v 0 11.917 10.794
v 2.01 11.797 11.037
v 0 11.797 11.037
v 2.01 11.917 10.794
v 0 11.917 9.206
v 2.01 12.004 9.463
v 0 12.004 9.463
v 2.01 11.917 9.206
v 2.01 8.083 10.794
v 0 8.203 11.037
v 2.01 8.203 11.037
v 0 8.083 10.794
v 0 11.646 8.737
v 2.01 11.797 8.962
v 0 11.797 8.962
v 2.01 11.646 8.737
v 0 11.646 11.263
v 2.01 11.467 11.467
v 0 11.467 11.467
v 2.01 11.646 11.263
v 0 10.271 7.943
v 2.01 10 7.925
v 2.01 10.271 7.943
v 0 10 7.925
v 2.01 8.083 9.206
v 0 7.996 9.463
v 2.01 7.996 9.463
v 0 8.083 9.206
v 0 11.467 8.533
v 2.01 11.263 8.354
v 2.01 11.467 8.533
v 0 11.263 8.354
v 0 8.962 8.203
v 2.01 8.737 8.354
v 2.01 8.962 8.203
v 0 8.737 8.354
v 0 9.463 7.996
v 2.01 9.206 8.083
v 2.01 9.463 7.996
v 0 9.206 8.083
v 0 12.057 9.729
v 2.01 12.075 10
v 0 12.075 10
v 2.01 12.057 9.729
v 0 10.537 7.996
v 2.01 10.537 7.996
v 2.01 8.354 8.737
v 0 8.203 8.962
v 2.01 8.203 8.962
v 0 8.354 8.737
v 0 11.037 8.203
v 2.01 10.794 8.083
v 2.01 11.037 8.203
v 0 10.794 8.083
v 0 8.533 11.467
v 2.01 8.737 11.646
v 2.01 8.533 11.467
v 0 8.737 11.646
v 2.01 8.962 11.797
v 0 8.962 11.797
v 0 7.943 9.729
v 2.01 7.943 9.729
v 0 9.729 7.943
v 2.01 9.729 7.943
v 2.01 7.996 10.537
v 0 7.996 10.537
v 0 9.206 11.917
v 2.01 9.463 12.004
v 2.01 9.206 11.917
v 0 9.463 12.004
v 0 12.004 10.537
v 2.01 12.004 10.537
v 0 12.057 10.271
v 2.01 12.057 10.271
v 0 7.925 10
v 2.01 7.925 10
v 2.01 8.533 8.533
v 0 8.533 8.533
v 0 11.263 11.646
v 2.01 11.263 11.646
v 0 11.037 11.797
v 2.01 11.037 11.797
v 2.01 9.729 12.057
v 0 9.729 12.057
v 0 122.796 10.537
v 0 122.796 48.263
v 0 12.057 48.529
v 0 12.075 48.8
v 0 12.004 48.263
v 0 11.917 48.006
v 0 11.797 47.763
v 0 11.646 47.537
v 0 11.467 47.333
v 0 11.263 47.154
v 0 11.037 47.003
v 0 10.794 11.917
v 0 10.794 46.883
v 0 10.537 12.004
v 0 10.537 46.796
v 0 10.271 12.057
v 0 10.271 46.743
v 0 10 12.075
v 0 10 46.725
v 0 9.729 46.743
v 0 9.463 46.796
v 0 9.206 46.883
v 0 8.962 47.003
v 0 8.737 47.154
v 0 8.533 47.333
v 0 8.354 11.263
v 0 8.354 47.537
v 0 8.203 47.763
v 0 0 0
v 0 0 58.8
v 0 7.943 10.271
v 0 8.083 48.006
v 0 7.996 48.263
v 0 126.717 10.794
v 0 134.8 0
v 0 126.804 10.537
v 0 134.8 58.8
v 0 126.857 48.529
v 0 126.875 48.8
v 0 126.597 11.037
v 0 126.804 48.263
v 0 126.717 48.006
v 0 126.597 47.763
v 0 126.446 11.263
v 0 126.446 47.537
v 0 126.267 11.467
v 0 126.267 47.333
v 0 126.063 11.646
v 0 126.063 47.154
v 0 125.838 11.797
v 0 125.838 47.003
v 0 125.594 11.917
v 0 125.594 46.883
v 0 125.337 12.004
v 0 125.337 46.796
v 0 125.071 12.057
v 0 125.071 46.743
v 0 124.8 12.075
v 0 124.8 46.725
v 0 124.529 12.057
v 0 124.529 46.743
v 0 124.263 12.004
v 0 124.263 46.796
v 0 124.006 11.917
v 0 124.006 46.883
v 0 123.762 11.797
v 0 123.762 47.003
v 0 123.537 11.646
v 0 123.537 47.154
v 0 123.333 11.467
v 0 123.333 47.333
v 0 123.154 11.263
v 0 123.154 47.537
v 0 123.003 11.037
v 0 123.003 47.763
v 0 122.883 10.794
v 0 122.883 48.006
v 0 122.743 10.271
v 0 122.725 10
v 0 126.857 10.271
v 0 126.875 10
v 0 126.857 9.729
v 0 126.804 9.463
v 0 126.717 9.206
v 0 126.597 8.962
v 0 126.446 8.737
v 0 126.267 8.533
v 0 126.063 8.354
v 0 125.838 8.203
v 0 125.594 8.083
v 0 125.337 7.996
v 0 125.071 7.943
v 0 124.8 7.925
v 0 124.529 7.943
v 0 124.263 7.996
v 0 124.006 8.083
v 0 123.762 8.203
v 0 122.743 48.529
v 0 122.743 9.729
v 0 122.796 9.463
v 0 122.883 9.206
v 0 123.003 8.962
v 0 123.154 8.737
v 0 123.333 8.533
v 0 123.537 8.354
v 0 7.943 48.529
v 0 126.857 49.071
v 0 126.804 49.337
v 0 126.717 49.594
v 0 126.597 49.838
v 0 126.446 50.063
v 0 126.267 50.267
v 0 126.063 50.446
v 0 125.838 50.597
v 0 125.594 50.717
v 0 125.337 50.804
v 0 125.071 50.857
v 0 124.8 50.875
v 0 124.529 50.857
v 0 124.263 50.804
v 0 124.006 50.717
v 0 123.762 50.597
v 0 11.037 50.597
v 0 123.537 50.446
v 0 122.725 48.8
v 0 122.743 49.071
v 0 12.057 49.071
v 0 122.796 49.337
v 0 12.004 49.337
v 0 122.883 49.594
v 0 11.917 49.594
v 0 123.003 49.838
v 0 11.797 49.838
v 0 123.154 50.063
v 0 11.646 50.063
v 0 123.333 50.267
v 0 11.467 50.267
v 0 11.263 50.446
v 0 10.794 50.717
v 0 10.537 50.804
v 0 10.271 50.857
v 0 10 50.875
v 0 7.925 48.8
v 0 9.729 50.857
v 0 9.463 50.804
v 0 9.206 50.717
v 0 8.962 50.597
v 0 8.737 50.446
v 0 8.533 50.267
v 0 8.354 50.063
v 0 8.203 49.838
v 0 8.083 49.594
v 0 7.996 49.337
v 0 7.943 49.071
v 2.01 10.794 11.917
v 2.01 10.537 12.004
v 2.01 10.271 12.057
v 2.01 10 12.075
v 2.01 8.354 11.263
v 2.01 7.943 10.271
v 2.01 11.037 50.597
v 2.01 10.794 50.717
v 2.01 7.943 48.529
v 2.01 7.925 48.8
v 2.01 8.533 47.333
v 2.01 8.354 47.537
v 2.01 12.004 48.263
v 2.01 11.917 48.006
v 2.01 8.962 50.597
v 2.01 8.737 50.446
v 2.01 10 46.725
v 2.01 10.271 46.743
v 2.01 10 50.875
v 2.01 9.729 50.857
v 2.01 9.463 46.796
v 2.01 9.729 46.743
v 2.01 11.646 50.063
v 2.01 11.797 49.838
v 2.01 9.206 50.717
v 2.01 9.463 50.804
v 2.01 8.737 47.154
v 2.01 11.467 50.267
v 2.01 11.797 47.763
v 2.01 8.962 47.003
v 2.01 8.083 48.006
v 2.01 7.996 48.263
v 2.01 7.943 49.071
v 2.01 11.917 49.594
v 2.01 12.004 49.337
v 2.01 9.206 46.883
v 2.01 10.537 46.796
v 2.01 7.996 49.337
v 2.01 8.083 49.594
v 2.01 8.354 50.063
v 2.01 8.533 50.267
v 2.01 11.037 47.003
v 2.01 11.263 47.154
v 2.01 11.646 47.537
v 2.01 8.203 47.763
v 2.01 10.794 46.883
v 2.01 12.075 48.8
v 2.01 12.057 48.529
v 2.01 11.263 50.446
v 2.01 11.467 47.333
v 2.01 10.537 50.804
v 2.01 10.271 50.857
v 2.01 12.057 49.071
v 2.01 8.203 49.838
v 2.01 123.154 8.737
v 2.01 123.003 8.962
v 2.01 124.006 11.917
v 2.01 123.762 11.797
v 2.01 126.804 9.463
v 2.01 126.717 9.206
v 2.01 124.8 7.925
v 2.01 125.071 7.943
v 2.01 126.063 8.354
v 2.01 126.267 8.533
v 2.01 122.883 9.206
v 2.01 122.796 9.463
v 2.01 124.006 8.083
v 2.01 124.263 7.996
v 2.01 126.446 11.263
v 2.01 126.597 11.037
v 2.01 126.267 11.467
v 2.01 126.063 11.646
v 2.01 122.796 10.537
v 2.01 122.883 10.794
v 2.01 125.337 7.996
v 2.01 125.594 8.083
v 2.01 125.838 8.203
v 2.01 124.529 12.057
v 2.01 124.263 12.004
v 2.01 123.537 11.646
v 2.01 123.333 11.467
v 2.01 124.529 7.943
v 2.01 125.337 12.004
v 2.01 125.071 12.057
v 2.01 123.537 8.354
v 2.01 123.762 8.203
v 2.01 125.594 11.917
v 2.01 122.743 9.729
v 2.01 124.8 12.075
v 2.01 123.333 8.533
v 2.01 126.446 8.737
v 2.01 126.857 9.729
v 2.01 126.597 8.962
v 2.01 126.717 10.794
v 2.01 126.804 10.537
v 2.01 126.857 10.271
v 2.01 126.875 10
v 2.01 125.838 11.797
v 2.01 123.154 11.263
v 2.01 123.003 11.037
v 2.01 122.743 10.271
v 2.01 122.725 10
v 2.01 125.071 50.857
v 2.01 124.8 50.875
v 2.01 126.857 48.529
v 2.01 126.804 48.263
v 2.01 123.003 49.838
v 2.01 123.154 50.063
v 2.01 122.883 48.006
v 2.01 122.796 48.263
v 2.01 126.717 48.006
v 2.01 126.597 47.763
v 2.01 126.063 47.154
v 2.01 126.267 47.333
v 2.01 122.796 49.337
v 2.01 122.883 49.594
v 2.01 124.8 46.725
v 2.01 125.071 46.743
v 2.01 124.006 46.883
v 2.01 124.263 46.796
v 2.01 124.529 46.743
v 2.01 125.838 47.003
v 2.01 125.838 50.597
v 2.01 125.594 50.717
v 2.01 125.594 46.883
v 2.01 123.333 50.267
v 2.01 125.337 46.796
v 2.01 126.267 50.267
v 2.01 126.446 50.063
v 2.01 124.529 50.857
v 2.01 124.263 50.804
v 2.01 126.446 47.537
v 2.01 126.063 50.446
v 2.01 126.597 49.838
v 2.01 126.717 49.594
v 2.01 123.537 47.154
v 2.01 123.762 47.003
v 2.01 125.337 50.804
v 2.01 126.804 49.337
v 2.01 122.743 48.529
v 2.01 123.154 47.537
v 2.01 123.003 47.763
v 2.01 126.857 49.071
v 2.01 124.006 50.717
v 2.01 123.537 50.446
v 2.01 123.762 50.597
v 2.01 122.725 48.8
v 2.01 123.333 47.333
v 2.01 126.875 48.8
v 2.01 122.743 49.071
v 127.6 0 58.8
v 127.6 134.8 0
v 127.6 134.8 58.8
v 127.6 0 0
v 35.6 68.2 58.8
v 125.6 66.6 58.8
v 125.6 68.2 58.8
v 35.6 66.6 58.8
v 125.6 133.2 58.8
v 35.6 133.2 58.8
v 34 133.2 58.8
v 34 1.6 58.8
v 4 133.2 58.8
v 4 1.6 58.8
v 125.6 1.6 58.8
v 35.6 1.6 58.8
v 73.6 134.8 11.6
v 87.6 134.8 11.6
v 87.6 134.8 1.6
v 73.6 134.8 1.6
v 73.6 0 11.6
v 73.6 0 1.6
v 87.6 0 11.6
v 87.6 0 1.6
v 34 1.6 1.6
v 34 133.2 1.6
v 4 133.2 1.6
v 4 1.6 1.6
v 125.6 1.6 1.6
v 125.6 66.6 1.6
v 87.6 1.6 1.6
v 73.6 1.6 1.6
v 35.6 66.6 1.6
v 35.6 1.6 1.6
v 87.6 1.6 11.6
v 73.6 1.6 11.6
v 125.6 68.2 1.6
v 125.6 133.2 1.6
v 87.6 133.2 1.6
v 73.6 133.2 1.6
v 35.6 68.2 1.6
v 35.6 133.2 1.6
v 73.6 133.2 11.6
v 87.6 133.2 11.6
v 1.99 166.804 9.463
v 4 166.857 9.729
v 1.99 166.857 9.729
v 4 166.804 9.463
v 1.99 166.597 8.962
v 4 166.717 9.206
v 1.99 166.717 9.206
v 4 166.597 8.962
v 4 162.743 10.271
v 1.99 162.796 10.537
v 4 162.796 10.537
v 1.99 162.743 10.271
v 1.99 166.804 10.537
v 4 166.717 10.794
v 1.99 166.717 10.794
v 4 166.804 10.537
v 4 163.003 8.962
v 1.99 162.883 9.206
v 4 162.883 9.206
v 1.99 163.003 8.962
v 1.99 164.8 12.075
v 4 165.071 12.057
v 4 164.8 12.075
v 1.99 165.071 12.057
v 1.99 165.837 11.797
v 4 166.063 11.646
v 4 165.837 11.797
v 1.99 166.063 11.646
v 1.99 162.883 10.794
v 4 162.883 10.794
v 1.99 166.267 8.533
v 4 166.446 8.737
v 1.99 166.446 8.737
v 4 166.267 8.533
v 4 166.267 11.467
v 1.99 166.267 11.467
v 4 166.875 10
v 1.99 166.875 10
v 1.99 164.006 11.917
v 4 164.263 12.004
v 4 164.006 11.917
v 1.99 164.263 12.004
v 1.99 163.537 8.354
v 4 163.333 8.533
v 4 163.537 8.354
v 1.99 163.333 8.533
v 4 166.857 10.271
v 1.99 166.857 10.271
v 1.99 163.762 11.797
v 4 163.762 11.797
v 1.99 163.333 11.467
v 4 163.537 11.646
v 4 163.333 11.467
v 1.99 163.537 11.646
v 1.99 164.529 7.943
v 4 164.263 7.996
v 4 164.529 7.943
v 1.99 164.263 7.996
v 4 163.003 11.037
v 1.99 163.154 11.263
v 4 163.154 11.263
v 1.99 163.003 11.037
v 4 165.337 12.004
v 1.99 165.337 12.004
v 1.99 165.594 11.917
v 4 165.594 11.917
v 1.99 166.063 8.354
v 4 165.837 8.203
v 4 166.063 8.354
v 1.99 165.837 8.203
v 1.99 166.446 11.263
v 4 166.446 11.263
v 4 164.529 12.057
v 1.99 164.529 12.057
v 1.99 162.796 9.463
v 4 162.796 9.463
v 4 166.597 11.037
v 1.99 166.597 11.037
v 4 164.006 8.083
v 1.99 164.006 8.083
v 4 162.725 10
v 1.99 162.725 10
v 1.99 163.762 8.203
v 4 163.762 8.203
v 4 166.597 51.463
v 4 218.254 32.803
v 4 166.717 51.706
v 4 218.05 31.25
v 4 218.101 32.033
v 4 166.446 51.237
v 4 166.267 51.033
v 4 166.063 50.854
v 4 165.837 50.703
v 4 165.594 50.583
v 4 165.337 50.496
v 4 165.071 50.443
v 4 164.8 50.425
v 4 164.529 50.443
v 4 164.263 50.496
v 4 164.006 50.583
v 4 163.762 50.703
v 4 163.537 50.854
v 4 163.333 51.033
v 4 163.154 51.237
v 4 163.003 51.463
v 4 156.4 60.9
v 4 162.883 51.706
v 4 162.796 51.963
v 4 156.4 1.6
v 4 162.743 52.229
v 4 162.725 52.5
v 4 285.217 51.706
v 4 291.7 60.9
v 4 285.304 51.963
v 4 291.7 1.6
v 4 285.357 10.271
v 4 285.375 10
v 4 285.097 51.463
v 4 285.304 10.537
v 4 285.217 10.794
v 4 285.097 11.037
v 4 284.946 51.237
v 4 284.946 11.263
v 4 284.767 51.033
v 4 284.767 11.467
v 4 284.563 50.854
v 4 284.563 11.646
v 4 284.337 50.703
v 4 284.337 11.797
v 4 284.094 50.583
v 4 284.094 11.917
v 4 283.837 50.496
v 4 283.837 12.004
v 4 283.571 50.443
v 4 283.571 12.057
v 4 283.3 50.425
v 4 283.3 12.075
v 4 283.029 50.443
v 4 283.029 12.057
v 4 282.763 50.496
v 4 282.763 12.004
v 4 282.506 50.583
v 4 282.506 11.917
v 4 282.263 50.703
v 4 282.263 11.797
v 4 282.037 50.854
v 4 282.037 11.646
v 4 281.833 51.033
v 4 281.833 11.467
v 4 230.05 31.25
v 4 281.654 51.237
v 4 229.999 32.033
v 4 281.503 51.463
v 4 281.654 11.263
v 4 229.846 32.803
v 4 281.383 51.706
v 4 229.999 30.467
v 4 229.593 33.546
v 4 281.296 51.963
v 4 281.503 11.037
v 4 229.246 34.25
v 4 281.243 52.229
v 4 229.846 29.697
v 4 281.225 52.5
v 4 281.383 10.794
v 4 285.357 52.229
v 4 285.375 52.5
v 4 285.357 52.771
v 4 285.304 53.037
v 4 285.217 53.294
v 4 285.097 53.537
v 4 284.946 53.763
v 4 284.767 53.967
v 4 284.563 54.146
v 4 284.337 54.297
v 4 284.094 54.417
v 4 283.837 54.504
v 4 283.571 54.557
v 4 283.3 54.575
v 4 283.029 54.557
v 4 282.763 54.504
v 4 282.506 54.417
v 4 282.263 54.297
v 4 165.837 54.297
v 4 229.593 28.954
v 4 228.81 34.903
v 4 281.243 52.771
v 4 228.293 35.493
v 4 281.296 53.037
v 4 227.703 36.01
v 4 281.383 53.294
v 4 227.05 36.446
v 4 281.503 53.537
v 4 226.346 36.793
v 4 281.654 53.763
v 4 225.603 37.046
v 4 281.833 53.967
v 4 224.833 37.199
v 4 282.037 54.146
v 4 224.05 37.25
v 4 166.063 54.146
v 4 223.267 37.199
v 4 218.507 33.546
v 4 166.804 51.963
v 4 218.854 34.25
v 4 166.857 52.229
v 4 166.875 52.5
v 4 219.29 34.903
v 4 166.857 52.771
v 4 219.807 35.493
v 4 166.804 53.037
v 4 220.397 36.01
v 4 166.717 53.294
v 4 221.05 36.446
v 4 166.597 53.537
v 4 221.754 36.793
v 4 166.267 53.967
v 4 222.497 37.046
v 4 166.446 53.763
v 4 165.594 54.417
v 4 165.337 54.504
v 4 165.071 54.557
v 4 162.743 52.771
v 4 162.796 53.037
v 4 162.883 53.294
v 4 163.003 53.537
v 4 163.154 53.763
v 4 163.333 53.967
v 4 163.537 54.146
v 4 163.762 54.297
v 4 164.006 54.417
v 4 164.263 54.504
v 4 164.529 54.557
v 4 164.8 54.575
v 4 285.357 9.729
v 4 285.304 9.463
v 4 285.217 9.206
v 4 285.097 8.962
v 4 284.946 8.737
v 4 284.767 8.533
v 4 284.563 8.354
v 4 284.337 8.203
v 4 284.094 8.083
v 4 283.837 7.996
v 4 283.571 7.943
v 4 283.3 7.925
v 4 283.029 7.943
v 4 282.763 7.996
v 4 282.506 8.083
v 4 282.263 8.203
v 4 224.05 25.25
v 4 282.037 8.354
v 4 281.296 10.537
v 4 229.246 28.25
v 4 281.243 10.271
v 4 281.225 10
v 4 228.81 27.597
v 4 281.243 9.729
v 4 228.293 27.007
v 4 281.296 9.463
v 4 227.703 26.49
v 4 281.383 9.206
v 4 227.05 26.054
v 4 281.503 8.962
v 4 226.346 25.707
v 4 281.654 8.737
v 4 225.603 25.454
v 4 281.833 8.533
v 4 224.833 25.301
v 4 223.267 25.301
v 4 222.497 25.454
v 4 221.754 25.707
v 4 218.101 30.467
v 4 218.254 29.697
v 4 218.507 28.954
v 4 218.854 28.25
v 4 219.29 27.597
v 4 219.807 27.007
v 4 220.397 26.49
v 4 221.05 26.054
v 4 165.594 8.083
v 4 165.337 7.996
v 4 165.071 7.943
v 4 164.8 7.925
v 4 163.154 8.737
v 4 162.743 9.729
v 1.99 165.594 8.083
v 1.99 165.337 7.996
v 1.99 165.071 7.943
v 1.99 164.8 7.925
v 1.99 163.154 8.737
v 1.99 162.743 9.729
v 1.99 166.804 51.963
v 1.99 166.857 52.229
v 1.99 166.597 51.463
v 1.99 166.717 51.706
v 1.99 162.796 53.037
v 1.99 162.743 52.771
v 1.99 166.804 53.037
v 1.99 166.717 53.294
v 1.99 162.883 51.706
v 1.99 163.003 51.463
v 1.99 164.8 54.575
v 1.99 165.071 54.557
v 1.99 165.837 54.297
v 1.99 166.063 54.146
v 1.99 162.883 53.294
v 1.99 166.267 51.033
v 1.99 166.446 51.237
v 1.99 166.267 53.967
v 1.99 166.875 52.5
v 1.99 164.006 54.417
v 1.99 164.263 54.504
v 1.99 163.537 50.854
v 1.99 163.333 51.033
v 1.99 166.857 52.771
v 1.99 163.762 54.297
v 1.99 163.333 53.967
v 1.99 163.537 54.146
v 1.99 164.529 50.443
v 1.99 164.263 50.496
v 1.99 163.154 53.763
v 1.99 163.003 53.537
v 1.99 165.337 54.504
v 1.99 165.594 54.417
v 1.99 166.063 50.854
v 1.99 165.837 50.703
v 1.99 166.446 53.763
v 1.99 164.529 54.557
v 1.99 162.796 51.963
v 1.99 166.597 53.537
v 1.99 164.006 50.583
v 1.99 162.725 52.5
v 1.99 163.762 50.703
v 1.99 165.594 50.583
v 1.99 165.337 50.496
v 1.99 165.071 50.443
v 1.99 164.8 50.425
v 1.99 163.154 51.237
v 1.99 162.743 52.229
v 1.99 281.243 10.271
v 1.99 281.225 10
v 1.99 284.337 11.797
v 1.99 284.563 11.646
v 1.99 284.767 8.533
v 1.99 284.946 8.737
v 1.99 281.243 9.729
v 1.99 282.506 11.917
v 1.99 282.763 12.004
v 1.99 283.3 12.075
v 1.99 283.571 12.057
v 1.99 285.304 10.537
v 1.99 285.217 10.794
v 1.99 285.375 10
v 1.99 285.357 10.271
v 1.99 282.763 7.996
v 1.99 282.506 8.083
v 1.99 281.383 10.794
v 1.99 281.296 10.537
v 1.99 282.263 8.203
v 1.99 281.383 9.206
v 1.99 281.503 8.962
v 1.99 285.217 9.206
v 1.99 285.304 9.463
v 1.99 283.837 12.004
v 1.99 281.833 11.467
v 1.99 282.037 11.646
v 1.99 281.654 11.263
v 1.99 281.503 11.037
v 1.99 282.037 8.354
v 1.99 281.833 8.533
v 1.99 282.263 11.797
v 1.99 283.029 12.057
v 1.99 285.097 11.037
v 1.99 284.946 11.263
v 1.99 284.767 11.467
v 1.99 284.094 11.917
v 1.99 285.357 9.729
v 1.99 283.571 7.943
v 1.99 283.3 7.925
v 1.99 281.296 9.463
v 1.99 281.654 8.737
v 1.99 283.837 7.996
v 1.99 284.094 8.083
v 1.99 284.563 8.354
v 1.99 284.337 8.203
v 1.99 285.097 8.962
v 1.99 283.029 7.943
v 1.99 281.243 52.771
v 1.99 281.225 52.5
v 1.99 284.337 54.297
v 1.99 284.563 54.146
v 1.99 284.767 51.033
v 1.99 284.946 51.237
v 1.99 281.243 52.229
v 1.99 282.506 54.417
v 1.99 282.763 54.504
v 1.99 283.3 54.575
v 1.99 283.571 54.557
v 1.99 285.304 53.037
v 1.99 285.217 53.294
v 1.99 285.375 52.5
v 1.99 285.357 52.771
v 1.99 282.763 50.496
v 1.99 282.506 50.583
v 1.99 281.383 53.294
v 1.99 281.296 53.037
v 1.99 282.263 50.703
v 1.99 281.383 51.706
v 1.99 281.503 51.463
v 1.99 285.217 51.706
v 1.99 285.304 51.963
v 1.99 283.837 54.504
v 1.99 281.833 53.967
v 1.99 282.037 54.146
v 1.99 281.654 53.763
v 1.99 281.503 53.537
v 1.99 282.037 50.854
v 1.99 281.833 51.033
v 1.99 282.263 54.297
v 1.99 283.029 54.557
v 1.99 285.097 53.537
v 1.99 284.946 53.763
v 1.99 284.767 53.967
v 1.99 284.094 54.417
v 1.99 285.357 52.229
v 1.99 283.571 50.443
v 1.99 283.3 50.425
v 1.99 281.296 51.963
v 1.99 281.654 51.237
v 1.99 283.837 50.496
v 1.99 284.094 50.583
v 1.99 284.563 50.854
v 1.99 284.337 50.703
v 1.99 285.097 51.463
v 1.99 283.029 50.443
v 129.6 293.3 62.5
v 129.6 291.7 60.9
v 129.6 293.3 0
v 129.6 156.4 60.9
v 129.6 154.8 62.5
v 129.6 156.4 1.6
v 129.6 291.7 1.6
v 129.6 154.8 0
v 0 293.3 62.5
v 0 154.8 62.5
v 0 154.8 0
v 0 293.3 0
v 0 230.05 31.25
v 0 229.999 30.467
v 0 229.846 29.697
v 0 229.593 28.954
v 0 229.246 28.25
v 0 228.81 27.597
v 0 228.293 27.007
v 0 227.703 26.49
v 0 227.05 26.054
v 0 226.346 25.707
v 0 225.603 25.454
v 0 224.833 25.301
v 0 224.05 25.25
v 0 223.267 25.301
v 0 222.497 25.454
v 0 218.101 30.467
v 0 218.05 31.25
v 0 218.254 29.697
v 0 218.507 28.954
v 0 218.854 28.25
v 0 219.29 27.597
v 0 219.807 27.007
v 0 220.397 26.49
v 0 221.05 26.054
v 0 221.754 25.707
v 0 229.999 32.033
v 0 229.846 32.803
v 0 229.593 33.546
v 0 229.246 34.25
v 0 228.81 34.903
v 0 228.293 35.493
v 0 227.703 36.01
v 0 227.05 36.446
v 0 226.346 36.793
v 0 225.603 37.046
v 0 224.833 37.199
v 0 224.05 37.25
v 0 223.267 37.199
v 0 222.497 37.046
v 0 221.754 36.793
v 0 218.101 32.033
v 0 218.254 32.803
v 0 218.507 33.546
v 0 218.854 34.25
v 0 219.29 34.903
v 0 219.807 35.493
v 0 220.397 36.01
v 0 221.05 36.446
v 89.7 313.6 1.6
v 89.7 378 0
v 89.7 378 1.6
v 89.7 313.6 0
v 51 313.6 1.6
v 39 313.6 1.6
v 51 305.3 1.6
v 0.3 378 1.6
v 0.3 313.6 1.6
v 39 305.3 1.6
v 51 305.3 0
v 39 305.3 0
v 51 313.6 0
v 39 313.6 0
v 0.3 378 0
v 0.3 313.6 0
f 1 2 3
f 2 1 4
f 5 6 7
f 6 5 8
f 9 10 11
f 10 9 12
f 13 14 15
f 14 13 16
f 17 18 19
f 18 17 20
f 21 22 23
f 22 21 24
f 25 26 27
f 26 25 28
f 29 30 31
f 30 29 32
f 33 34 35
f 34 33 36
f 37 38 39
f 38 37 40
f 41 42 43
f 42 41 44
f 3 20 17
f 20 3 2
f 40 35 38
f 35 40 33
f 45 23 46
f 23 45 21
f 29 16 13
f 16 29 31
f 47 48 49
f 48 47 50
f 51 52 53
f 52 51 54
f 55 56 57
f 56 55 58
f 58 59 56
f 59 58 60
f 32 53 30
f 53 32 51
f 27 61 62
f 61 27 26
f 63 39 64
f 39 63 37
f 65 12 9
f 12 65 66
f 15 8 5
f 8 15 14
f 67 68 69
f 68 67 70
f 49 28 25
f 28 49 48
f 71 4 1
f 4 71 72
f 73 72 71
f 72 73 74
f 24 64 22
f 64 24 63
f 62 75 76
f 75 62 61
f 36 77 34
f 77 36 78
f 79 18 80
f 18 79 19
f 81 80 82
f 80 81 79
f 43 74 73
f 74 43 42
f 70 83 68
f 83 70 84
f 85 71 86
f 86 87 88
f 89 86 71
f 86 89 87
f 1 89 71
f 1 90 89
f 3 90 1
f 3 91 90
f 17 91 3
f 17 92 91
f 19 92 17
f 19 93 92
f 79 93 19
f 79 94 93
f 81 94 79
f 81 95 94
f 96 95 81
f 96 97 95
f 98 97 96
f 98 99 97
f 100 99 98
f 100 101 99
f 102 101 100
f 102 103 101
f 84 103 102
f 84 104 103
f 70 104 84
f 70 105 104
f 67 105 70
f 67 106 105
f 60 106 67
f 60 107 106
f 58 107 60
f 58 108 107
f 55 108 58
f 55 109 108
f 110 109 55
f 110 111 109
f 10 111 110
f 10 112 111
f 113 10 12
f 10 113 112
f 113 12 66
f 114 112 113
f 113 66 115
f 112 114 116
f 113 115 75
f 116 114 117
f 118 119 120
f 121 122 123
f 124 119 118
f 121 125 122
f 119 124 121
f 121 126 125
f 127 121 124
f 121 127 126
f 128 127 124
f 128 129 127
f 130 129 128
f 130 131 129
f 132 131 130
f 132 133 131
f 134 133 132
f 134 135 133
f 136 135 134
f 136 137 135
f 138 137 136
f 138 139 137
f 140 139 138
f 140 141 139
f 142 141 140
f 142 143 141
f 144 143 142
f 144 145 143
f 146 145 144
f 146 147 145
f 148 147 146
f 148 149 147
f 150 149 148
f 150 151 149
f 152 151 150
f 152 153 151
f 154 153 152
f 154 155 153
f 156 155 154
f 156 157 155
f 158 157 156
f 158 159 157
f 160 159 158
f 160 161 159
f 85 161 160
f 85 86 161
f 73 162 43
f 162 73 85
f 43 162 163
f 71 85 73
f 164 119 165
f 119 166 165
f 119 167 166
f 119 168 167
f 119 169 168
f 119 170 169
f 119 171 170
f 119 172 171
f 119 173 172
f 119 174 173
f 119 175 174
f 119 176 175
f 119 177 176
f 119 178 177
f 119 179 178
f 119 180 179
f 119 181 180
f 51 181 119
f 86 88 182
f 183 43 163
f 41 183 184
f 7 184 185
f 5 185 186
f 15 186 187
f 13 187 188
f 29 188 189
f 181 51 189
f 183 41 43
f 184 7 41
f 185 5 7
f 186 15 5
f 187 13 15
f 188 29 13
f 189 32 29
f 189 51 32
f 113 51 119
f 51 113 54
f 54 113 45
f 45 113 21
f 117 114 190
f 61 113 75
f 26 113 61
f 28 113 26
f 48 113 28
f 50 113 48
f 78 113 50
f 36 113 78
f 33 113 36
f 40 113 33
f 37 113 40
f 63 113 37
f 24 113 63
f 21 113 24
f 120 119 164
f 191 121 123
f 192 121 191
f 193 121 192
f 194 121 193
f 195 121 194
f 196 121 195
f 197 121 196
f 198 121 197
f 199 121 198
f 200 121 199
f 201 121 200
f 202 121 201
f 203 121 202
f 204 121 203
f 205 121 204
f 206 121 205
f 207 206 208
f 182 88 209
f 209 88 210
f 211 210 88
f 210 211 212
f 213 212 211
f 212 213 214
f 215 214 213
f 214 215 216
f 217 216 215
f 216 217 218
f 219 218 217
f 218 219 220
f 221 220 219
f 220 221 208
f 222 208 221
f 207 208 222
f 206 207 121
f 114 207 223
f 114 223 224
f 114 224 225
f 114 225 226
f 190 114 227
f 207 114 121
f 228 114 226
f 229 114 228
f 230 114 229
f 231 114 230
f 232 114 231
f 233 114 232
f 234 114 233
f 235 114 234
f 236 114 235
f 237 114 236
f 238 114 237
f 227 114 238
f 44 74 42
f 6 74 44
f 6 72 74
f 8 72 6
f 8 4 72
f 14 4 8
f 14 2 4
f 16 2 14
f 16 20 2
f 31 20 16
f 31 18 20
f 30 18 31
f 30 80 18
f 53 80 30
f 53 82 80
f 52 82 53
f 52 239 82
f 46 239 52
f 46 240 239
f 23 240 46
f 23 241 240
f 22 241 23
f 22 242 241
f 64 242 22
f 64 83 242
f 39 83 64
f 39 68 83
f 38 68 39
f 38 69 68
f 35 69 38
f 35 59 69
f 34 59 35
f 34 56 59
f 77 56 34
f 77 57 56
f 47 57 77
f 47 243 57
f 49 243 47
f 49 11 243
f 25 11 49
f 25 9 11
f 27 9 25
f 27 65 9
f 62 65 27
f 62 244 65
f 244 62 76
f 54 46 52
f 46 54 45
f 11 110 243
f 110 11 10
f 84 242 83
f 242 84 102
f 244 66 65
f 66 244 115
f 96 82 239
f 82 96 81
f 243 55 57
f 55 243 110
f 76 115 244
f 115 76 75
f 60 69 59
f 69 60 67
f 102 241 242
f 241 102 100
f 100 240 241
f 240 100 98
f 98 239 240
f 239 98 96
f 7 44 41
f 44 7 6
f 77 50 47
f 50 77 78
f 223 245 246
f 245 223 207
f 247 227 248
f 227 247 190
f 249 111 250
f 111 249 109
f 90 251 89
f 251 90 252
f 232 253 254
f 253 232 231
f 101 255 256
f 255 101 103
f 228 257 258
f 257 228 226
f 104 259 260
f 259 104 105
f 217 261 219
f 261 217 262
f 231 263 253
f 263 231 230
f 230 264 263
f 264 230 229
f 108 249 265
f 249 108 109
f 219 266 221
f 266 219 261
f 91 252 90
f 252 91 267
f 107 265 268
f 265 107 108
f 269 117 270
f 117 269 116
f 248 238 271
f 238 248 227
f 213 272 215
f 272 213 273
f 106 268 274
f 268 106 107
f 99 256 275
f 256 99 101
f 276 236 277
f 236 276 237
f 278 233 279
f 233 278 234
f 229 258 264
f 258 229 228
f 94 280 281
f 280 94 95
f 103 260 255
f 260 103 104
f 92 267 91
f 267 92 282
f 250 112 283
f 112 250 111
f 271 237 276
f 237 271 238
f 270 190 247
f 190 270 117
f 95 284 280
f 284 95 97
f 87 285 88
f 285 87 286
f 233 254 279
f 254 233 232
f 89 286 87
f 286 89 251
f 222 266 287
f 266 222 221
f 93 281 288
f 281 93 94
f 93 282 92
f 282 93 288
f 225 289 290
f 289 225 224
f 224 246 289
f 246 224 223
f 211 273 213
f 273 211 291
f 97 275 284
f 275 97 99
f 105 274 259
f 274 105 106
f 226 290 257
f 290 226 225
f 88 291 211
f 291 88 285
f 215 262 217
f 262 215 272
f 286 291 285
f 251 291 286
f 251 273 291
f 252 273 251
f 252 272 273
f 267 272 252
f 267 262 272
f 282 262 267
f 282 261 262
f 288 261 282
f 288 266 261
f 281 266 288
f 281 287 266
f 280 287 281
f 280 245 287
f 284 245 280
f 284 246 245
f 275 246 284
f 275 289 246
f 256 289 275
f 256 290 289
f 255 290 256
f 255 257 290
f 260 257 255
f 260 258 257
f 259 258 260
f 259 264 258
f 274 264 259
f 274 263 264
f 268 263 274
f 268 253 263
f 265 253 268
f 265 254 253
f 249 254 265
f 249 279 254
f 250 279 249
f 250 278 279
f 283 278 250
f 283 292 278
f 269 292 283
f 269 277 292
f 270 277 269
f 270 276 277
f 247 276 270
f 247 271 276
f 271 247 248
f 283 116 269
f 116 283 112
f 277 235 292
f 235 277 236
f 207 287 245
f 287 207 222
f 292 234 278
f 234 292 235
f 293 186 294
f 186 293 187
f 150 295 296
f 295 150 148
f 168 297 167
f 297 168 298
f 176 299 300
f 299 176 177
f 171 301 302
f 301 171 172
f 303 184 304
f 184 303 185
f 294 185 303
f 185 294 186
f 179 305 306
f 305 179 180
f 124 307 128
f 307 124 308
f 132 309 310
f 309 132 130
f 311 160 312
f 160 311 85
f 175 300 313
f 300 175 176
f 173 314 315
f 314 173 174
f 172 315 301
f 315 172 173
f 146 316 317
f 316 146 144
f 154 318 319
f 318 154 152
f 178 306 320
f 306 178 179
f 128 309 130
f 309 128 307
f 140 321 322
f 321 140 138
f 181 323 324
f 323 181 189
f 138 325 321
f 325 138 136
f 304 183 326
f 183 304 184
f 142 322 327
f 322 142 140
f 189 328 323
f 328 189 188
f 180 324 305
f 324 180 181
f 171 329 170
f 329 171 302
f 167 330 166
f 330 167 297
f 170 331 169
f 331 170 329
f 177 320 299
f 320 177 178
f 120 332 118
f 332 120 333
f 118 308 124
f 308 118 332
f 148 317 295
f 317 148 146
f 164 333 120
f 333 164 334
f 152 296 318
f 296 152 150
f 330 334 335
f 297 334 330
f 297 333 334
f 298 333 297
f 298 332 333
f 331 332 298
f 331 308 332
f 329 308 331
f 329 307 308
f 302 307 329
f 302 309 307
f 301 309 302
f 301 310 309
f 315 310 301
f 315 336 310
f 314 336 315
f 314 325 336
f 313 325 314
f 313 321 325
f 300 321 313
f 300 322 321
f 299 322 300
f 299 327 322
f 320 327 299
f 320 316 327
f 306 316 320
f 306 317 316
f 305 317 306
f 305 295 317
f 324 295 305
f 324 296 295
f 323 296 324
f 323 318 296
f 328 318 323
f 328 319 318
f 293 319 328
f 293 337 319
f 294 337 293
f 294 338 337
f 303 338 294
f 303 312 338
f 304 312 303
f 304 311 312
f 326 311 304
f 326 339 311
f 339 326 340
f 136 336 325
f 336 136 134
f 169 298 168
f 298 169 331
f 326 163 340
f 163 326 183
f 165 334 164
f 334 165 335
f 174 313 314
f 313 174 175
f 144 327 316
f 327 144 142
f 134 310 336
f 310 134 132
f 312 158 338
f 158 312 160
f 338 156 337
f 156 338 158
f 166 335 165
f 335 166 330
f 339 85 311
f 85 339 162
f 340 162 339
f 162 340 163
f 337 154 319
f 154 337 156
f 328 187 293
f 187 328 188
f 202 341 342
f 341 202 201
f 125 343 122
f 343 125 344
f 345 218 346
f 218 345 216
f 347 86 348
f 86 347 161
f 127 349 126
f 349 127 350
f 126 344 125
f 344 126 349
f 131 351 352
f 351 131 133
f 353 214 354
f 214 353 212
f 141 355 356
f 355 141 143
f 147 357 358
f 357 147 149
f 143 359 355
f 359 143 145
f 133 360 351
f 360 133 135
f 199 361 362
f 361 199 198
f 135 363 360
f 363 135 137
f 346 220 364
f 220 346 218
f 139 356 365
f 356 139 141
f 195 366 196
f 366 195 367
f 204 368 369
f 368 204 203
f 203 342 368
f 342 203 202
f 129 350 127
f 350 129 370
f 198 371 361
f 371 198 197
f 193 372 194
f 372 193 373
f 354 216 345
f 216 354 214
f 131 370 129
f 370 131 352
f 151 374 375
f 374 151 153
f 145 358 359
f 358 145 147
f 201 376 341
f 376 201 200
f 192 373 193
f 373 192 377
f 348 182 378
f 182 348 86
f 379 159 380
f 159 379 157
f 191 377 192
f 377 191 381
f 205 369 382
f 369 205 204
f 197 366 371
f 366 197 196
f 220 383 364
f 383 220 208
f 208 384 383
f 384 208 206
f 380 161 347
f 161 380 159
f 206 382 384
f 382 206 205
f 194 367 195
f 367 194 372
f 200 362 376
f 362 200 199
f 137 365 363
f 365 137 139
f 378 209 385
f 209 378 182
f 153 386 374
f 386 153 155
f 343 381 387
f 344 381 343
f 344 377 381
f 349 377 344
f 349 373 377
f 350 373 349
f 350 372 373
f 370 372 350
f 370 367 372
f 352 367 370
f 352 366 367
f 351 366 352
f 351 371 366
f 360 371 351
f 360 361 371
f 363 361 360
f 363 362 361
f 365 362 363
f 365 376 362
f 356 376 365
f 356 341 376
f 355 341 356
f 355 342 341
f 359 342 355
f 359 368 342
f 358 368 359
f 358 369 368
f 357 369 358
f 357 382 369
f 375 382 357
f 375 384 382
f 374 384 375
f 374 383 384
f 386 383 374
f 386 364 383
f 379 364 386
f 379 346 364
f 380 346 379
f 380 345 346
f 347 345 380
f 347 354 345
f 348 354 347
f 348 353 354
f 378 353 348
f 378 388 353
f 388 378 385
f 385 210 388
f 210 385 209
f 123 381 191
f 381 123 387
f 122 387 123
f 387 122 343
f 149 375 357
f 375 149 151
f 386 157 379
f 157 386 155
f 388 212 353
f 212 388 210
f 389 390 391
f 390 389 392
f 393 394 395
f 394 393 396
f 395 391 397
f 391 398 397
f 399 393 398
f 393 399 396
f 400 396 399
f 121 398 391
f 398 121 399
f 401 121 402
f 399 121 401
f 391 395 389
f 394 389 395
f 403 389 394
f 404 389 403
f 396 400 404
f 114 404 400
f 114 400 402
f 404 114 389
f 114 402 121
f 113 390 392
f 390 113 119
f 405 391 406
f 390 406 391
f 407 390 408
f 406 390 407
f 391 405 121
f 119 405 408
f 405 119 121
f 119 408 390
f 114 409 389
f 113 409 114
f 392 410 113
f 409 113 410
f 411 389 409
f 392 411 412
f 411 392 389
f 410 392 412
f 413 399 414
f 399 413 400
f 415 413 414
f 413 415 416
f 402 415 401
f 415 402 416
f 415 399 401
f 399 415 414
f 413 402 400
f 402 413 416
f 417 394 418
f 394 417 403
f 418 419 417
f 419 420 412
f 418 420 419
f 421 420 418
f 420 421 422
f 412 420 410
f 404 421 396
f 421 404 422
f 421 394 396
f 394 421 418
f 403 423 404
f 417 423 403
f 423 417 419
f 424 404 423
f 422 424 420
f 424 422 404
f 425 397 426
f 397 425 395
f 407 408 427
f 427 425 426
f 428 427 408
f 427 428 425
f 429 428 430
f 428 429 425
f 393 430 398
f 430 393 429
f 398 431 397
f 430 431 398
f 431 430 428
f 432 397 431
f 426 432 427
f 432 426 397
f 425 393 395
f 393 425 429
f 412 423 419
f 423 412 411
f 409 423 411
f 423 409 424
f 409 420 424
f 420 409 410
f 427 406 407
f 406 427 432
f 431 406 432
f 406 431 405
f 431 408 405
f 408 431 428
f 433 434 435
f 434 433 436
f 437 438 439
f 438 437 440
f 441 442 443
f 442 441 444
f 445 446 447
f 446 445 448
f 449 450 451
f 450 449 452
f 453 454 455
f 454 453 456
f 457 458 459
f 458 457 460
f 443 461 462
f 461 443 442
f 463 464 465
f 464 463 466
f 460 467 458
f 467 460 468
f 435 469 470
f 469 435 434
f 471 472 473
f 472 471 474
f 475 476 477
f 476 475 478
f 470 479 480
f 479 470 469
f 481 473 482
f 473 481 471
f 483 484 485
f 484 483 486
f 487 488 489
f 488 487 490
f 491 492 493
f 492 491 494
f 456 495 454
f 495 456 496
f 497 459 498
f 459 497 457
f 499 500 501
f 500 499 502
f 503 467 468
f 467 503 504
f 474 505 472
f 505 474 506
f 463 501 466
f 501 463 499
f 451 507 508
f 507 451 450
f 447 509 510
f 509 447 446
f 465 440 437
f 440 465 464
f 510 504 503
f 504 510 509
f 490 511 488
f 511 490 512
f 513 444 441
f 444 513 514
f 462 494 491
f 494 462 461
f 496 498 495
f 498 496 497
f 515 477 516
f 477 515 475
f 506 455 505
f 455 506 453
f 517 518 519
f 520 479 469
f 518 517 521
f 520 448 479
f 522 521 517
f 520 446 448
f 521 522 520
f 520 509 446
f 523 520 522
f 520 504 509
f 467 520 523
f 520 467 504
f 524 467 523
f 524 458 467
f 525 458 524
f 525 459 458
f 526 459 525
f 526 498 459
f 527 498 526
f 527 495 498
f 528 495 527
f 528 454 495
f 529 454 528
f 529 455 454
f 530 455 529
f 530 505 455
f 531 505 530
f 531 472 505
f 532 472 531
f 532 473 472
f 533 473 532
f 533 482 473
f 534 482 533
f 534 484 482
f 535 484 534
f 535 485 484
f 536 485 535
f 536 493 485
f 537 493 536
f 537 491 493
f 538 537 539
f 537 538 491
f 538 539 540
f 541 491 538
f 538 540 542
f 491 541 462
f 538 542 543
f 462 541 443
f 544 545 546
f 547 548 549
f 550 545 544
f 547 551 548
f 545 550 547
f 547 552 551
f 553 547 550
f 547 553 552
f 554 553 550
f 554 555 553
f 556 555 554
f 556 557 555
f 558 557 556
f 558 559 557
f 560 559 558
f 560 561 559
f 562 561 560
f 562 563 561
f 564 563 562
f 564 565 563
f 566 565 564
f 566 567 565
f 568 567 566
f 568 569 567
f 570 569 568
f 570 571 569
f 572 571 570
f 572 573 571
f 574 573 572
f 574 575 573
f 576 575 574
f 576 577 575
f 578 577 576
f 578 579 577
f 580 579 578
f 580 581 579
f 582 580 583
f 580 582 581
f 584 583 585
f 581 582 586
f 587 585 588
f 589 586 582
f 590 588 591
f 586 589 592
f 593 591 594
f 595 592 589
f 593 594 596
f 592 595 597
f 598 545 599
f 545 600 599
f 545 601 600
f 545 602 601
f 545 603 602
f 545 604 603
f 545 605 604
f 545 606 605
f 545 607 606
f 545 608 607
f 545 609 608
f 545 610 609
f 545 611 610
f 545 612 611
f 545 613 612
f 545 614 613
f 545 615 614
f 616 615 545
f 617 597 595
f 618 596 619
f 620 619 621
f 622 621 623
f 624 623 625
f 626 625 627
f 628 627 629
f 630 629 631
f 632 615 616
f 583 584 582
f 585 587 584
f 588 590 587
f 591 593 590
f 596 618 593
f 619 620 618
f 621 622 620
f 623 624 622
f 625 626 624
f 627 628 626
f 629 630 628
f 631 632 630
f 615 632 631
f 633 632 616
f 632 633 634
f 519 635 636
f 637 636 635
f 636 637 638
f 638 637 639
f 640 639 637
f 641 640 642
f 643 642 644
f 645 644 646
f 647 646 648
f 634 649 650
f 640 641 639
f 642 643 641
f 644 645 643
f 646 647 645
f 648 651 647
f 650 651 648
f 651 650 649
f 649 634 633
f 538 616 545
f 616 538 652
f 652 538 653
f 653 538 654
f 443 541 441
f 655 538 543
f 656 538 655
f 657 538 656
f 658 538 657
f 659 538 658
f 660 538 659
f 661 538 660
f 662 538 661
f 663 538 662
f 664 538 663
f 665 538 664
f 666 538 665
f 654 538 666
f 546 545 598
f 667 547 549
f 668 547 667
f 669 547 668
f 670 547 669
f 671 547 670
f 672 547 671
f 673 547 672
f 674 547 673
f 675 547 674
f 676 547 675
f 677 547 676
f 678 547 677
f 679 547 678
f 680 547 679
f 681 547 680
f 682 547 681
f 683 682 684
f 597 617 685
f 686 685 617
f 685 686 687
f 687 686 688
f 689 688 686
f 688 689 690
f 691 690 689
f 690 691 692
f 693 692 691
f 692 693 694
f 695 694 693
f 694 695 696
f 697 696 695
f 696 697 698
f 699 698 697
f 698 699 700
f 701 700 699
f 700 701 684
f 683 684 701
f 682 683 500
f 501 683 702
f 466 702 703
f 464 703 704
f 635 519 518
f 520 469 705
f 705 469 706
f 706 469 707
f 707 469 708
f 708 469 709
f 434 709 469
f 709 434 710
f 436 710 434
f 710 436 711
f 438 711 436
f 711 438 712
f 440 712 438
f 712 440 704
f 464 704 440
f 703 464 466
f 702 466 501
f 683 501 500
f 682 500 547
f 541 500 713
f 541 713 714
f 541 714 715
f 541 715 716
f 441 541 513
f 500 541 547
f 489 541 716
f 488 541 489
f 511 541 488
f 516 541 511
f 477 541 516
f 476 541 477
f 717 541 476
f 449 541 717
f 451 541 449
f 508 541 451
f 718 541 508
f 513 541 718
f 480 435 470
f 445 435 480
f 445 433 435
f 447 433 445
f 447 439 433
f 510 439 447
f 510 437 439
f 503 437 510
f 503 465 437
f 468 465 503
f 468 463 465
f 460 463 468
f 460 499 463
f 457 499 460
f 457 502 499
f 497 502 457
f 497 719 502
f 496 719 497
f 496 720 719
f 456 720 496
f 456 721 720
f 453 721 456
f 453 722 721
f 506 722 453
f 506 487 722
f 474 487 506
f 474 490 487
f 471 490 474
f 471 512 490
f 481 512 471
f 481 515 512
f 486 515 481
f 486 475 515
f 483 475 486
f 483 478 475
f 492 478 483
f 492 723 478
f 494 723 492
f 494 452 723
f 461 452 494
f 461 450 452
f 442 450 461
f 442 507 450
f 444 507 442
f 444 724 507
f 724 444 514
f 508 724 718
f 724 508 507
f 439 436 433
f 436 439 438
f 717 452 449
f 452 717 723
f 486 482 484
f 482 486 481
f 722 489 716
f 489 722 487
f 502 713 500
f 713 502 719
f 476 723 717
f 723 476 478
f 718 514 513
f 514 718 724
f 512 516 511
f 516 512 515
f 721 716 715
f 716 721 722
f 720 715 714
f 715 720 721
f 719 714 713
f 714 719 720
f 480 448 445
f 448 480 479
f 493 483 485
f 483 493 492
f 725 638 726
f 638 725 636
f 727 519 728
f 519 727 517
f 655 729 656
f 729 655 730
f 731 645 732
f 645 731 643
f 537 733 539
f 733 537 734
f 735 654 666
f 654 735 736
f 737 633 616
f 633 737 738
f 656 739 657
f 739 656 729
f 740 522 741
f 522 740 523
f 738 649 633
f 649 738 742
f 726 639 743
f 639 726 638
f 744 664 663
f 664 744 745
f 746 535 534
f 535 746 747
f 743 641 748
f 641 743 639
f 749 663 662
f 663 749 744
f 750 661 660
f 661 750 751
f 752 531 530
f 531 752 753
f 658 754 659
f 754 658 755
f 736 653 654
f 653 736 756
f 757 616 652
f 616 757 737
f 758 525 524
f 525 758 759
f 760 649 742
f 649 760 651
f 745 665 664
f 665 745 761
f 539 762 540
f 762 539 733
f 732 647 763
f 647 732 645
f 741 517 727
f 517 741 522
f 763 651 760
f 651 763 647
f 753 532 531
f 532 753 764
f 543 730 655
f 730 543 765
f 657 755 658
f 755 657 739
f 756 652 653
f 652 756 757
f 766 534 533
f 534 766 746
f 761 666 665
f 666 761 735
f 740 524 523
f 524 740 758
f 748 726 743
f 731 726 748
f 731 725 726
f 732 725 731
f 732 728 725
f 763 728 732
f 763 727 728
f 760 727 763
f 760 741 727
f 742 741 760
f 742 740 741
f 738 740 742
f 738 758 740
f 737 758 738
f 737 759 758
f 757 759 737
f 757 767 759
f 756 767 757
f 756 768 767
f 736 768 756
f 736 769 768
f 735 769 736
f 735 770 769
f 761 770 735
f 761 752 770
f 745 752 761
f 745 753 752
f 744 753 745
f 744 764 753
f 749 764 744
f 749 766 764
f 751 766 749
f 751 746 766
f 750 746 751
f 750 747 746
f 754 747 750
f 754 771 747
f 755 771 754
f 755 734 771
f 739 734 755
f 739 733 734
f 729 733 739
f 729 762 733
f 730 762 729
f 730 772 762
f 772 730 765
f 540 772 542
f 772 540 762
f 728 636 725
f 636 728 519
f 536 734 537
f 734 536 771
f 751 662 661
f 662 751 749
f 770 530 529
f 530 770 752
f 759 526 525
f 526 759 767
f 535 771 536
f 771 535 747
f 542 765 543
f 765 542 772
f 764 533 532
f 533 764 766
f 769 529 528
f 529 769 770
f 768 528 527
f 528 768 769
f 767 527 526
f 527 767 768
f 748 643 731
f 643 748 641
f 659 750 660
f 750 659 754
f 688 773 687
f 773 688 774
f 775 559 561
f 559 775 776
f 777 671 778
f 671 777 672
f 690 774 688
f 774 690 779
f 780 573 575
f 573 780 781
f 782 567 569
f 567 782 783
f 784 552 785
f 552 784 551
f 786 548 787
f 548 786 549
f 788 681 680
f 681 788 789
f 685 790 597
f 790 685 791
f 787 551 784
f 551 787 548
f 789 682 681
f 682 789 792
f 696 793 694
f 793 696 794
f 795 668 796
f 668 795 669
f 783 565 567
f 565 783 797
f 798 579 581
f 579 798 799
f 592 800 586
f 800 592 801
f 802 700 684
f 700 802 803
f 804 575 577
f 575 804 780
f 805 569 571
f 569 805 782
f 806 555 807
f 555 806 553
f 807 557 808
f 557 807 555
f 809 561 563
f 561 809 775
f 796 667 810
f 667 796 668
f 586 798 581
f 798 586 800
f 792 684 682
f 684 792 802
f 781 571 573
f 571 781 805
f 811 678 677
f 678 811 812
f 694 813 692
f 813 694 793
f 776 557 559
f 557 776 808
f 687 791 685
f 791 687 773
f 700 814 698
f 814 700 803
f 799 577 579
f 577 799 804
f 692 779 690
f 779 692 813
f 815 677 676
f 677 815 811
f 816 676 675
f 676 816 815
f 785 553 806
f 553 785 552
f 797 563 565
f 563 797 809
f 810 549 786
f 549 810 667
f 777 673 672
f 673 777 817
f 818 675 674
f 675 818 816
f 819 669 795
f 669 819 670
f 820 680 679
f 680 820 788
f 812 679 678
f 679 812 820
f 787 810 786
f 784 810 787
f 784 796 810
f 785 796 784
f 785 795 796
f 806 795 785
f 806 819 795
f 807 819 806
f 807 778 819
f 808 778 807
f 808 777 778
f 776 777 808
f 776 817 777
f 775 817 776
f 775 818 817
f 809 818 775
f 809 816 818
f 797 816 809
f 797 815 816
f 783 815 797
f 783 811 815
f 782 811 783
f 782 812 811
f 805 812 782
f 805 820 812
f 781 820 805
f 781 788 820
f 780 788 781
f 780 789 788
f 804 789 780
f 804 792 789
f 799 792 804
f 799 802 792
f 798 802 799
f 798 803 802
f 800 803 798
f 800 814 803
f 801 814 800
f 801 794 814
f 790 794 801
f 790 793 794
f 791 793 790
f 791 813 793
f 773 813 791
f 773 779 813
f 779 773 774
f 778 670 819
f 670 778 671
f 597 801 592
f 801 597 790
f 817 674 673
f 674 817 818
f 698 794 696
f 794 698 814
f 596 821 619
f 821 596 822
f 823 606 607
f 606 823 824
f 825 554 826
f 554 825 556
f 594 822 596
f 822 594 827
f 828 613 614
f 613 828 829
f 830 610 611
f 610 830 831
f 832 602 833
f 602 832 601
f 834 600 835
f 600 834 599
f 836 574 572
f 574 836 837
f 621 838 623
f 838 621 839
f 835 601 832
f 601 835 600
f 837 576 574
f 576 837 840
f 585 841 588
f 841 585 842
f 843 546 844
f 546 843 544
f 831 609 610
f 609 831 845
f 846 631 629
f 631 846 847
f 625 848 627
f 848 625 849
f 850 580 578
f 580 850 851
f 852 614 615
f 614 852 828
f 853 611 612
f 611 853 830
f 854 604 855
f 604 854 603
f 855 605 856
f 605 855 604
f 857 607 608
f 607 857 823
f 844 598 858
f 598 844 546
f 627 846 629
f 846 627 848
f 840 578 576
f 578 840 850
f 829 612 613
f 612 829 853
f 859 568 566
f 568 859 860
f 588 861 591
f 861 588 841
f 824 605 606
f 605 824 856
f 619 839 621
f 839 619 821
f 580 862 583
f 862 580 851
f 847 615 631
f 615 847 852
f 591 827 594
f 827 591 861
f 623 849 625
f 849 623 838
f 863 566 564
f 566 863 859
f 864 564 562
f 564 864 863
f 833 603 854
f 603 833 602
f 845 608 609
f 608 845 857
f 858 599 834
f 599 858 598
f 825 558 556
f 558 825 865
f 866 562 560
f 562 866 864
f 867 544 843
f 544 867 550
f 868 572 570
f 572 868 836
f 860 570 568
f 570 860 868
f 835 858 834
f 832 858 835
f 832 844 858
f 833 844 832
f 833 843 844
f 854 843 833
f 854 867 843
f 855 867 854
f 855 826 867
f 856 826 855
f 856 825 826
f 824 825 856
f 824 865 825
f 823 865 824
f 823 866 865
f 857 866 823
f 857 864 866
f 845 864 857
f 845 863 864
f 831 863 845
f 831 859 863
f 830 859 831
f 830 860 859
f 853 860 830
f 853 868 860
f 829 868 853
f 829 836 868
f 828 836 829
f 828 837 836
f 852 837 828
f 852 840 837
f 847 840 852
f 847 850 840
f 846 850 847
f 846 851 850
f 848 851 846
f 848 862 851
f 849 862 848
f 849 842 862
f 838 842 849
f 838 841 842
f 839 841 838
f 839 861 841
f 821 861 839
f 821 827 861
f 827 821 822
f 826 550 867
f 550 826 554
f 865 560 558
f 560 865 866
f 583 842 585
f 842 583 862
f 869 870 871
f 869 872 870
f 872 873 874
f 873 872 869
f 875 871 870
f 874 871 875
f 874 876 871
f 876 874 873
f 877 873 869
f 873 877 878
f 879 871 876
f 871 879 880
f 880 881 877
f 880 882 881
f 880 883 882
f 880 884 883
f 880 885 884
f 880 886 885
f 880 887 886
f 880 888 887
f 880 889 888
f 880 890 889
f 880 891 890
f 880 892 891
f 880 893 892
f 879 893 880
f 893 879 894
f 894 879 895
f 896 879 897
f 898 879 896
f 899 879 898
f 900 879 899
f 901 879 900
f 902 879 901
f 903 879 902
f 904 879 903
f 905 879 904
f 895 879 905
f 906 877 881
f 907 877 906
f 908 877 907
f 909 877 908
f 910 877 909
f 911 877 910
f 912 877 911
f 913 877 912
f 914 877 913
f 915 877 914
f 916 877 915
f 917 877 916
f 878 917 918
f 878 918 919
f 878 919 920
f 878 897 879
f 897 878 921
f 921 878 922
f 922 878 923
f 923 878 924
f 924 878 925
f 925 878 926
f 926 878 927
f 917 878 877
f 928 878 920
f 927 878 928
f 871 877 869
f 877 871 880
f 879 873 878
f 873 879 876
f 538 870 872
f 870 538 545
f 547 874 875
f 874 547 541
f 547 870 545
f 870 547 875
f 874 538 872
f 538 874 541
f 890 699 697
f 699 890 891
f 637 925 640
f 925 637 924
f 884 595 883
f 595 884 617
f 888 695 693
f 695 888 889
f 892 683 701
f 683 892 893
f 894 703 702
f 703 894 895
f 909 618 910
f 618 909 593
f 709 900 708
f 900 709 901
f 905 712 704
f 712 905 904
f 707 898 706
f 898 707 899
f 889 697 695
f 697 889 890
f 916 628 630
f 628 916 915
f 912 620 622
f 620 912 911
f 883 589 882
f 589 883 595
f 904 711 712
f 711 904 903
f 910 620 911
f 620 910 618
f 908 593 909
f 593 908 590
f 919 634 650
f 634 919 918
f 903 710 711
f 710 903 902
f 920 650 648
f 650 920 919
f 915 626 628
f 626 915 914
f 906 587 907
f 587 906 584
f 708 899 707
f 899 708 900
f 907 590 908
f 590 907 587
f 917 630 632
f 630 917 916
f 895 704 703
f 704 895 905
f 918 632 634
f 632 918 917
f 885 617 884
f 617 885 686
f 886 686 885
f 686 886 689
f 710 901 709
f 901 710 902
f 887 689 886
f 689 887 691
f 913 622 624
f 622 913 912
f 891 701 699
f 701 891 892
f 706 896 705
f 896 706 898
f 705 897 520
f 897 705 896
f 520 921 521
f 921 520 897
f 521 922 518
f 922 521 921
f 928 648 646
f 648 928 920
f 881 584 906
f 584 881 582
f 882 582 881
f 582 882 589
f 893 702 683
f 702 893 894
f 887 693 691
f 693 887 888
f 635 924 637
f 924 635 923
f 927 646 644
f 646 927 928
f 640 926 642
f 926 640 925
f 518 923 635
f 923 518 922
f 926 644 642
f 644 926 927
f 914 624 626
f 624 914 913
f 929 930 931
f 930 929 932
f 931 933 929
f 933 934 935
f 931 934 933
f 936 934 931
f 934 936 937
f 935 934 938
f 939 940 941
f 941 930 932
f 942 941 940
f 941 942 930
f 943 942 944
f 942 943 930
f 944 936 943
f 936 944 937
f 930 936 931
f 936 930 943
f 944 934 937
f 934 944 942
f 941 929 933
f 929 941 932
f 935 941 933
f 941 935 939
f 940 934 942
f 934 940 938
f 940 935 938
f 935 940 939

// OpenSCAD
// deckbox-01.scad
// Deckbox estilo caixa de fósforo (matchbox), com 3 compartimentos na
// bandeja: dois lado a lado pra decks de 60 cartas (sleeved) DEITADAS
// (empilhadas horizontalmente, não em pé), e um terceiro abaixo dos dois
// (ocupando toda a largura) pra dados/moedas. Cada compartimento de deck
// tem um elevador — uma plataforma solta com uma aba — pra levantar o
// deck inteiro pra fora, até a última carta.
//
// A bandeja desliza dentro de uma capa fechada em UMA ponta (a outra fica
// aberta, por onde a bandeja entra). Fechamento por 4 ímãs (um em cada
// canto) na ponta da bandeja, espelhados por outros 4 na tampa da capa —
// quando a bandeja é empurrada até o fim, os ímãs se encostam e travam por
// atração. Um furo passante no fundo da capa deixa empurrar a bandeja de
// volta pra fora com o dedo.
//
// Peças: "tray" (bandeja), "sleeve" (capa) e "lifter" (elevador — imprimir
// 2, um por compartimento de deck; a mesma peça serve nos dois lados, é só
// virar 180°). Exportar separado:
//   openscad -o stl/deckbox-01-tray.stl    -D 'part="tray"'    deckbox-01.scad
//   openscad -o stl/deckbox-01-sleeve.stl  -D 'part="sleeve"'  deckbox-01.scad
//   openscad -o stl/deckbox-01-lifter.stl  -D 'part="lifter"'  deckbox-01.scad

/* [Peça a renderizar] */
part = "both"; // "tray" | "sleeve" | "lifter" | "both" (preview lado a lado, não montado)

/* [Cartas - deitadas, empilhadas na vertical] */
card_width             = 63; // mm, largura da carta (standard TCG)
card_height             = 88; // mm, altura da carta (standard TCG) — vira a profundidade do compartimento
card_count              = 60; // cartas por deck (com sleeve) — um compartimento por deck
sleeved_card_thickness  = 0.8; // mm por carta já com sleeve — confirmar com a sleeve real

/* [Compartimento de dados/moedas] */
dice_length = 30; // mm, profundidade do compartimento (largura = a dos dois decks juntos)

/* [Elevador do deck - plataforma solta com aba] */
lifter_thickness = 1.6; // mm, espessura da plataforma e da aba
lifter_gap       = 0.3; // mm, folga ao redor da plataforma pra subir livre, sem travar
tab_width        = 12;  // mm, largura da aba (por onde você puxa)
tab_length       = 8;   // mm, quanto a aba sai pra fora da parede lateral
notch_w          = tab_width + 2; // mm, largura do vão na parede por onde a aba passa
notch_h          = 10;  // mm, altura do vão a partir do chão (espaço pro dedo pegar a aba)

/* [Folgas] */
card_gap      = 2;    // folga extra em largura/profundidade pra carta não ficar apertada
deck_slack    = 6;    // espaço extra na altura da pilha (Z) pra facilitar tirar/guardar as cartas
fit_tolerance = 0.25; // folga por lado entre bandeja e caixa, pra deslizar sem travar

/* [Paredes] */
wall      = 1.6; // paredes externas (laterais/fundo/tubo)
end_wall  = 4;   // parede da ponta com ímã — mais grossa que wall, só o suficiente pro rebaixo do ímã
back_wall = 2;  // parede de trás da bandeja (sólida) — é a aba que sempre fica pra fora da capa, pra puxar
divider   = 1.6; // parede interna entre os 3 compartimentos

/* [Ímãs 4x2mm - discos, um em cada canto] */
magnet_d      = 4;    // mm, diâmetro
magnet_h      = 2;    // mm, espessura
magnet_fit    = 0.15; // mm, folga de encaixe pressionado (press-fit; se ficar frouxo, um pingo de cola resolve)
magnet_margin = 10;   // mm, distância do centro de cada ímã até as bordas da ponta

/* [Furo pra empurrar a bandeja] */
finger_hole_d = 12; // mm, diâmetro do furo passante no fundo da capa

/* [Qualidade] */
$fn = 48;

// ---------------------------------------------------------------------
// Derivados
// ---------------------------------------------------------------------
deck_stack_height = card_count * sleeved_card_thickness; // altura da pilha de UM deck deitado (60 cartas)

lane_inner_w = card_width + card_gap;   // Y: largura interna de cada compartimento de deck
lane_inner_l = card_height + card_gap;  // X: profundidade de cada compartimento (altura da carta, deitada)

// largura interna total: os dois compartimentos de deck lado a lado + a divisória entre eles
tray_inner_w = 2 * lane_inner_w + divider;
// Z: elevador embaixo + altura da pilha de cartas deitadas + folga
tray_inner_h = lifter_thickness + deck_stack_height + deck_slack;
// comprimento interno total: compartimento de dados + divisória + zona dos decks
tray_inner_l = dice_length + divider + lane_inner_l;

tray_outer_w = tray_inner_w + 2 * wall;
tray_outer_h = tray_inner_h + 2 * wall;
tray_outer_l = tray_inner_l + end_wall + back_wall; // ponta do ímã de um lado, aba de puxar sólida do outro

sleeve_cavity_w = tray_outer_w + 2 * fit_tolerance;
sleeve_cavity_h = tray_outer_h + 2 * fit_tolerance;
// a capa cobre TUDO até o começo da parede de trás da bandeja (nada de compartimento
// fica exposto quando fechada — só a parede sólida `back_wall` fica de fora)
sleeve_cavity_l = tray_inner_l + end_wall;

sleeve_outer_w = sleeve_cavity_w + 2 * wall;
sleeve_outer_h = sleeve_cavity_h + 2 * wall;
sleeve_outer_l = sleeve_cavity_l + end_wall; // + a ponta fechada (tampa)

// ---------------------------------------------------------------------
// Bandeja (tray): fundo + 4 paredes fechadas, aberta só em cima, com 3
// compartimentos internos.
// A ponta em x=0 é a que entra primeiro na caixa e carrega os 4 ímãs de
// canto. Nessa ponta fica o compartimento de dados/moedas (mais fundo, só
// aparece quando a bandeja é puxada quase até o fim); os dois
// compartimentos de deck ficam do lado da parede de trás — `back_wall` —
// (aparecem primeiro ao puxar a bandeja). Cada compartimento de deck tem
// um vão pequeno perto do chão, na parede externa, por onde passa a aba
// do elevador (as cartas ficam deitadas, empilhadas em cima do elevador).
// ---------------------------------------------------------------------
module tray() {
    lanes_x = end_wall + dice_length + divider;
    notch_x = lanes_x + lane_inner_l / 2; // centralizado no comprimento de cada compartimento de deck

    difference() {
        cube([tray_outer_l, tray_outer_w, tray_outer_h]);

        // compartimento de dados/moedas — ocupa toda a largura
        translate([end_wall, wall, wall])
            cube([dice_length, tray_inner_w, tray_outer_h]); // sobe além do topo -> topo aberto

        // dois compartimentos de deck, lado a lado, separados por `divider`
        translate([lanes_x, wall, wall])
            cube([lane_inner_l, lane_inner_w, tray_outer_h]);
        translate([lanes_x, wall + lane_inner_w + divider, wall])
            cube([lane_inner_l, lane_inner_w, tray_outer_h]);

        // vão pequeno em cada parede externa, por onde passa a aba do elevador
        grab_notch(notch_x, 0, wall);                  // parede externa esquerda
        grab_notch(notch_x, tray_outer_w - wall, wall); // parede externa direita

        // 4 ímãs de canto na ponta (precisa estar dentro do difference() pra CAVAR, não somar)
        magnet_corners(x = 0, w = tray_outer_w, h = tray_outer_h, dir = 1);
    }
}

// ---------------------------------------------------------------------
// Caixa externa (sleeve): tubo com a ponta em x=0 fechada e a outra aberta,
// por onde a bandeja entra. 4 ímãs de canto na ponta fechada, virados pra
// dentro (espelhando os da bandeja), e um furo passante no meio pra
// empurrar a bandeja de volta com o dedo.
// ---------------------------------------------------------------------
module sleeve() {
    difference() {
        cube([sleeve_outer_l, sleeve_outer_w, sleeve_outer_h]);
        translate([end_wall, wall, wall])
            cube([sleeve_outer_l, sleeve_cavity_w, sleeve_cavity_h]); // sobe além da frente -> frente aberta
        finger_hole();

        // 4 ímãs de canto na tampa (precisa estar dentro do difference() pra CAVAR, não somar)
        magnet_corners(x = end_wall, w = sleeve_outer_w, h = sleeve_outer_h, dir = -1);
    }
}

// Rebaixo cilíndrico pra UM ímã, em (x, y, z).
// dir = 1  -> cava a partir de x pra dentro (+X)  [usado na bandeja]
// dir = -1 -> cava a partir de x pra fora (-X)     [usado na caixa]
module magnet_hole(x, y, z, dir) {
    translate([x, y, z])
        rotate([0, dir * 90, 0])
            cylinder(h = magnet_h + 0.01, d = magnet_d + magnet_fit);
}

// 4 ímãs, um em cada canto de uma parede de ponta (w x h), a `magnet_margin`
// das bordas.
module magnet_corners(x, w, h, dir) {
    for (yy = [magnet_margin, w - magnet_margin])
        for (zz = [magnet_margin, h - magnet_margin])
            magnet_hole(x, yy, zz, dir);
}

// Furo passante centralizado no fundo da capa (sleeve), pra empurrar a
// bandeja de volta pra fora com o dedo.
module finger_hole() {
    translate([-0.1, sleeve_outer_w / 2, sleeve_outer_h / 2])
        rotate([0, 90, 0])
            cylinder(h = end_wall + 0.2, d = finger_hole_d);
}

// Vão pequeno numa parede (em x, começando em y0, ao longo de `thickness`),
// rente ao chão da bandeja — só o suficiente pra aba do elevador passar e
// pro dedo alcançar e puxar.
module grab_notch(x, y0, thickness) {
    translate([x - notch_w / 2, y0 - 0.1, wall])
        cube([notch_w, thickness + 0.2, notch_h]);
}

// ---------------------------------------------------------------------
// Elevador (lifter): plataforma solta que fica no chão de um compartimento
// de deck, embaixo das cartas, com uma aba que sai pela parede (pelo
// grab_notch) pra você puxar e levantar o deck inteiro de uma vez, até a
// última carta. A mesma peça serve nos dois compartimentos — só virar 180°.
// Aba sai pelo lado y=0 (visto de cima).
// ---------------------------------------------------------------------
module lifter() {
    platform_l = lane_inner_l - 2 * lifter_gap;
    platform_w = lane_inner_w - 2 * lifter_gap;

    // plataforma
    translate([lifter_gap, lifter_gap, 0])
        cube([platform_l, platform_w, lifter_thickness]);

    // aba, centralizada no comprimento, saindo pelo lado y=0 (sobrepõe um
    // pouco a plataforma, em vez de só encostar, pra garantir união sólida)
    translate([lane_inner_l / 2 - tab_width / 2, -tab_length, 0])
        cube([tab_width, tab_length + lifter_gap + 0.2, lifter_thickness]);
}

// ---------------------------------------------------------------------
// Render
// ---------------------------------------------------------------------
if (part == "tray") {
    tray();
} else if (part == "sleeve") {
    sleeve();
} else if (part == "lifter") {
    lifter();
} else {
    // preview lado a lado (não montado), só pra visualizar as três peças
    tray();
    translate([0, tray_outer_w + 20, 0])
        sleeve();
    translate([0, tray_outer_w + sleeve_outer_w + 40, 0])
        lifter();
}
